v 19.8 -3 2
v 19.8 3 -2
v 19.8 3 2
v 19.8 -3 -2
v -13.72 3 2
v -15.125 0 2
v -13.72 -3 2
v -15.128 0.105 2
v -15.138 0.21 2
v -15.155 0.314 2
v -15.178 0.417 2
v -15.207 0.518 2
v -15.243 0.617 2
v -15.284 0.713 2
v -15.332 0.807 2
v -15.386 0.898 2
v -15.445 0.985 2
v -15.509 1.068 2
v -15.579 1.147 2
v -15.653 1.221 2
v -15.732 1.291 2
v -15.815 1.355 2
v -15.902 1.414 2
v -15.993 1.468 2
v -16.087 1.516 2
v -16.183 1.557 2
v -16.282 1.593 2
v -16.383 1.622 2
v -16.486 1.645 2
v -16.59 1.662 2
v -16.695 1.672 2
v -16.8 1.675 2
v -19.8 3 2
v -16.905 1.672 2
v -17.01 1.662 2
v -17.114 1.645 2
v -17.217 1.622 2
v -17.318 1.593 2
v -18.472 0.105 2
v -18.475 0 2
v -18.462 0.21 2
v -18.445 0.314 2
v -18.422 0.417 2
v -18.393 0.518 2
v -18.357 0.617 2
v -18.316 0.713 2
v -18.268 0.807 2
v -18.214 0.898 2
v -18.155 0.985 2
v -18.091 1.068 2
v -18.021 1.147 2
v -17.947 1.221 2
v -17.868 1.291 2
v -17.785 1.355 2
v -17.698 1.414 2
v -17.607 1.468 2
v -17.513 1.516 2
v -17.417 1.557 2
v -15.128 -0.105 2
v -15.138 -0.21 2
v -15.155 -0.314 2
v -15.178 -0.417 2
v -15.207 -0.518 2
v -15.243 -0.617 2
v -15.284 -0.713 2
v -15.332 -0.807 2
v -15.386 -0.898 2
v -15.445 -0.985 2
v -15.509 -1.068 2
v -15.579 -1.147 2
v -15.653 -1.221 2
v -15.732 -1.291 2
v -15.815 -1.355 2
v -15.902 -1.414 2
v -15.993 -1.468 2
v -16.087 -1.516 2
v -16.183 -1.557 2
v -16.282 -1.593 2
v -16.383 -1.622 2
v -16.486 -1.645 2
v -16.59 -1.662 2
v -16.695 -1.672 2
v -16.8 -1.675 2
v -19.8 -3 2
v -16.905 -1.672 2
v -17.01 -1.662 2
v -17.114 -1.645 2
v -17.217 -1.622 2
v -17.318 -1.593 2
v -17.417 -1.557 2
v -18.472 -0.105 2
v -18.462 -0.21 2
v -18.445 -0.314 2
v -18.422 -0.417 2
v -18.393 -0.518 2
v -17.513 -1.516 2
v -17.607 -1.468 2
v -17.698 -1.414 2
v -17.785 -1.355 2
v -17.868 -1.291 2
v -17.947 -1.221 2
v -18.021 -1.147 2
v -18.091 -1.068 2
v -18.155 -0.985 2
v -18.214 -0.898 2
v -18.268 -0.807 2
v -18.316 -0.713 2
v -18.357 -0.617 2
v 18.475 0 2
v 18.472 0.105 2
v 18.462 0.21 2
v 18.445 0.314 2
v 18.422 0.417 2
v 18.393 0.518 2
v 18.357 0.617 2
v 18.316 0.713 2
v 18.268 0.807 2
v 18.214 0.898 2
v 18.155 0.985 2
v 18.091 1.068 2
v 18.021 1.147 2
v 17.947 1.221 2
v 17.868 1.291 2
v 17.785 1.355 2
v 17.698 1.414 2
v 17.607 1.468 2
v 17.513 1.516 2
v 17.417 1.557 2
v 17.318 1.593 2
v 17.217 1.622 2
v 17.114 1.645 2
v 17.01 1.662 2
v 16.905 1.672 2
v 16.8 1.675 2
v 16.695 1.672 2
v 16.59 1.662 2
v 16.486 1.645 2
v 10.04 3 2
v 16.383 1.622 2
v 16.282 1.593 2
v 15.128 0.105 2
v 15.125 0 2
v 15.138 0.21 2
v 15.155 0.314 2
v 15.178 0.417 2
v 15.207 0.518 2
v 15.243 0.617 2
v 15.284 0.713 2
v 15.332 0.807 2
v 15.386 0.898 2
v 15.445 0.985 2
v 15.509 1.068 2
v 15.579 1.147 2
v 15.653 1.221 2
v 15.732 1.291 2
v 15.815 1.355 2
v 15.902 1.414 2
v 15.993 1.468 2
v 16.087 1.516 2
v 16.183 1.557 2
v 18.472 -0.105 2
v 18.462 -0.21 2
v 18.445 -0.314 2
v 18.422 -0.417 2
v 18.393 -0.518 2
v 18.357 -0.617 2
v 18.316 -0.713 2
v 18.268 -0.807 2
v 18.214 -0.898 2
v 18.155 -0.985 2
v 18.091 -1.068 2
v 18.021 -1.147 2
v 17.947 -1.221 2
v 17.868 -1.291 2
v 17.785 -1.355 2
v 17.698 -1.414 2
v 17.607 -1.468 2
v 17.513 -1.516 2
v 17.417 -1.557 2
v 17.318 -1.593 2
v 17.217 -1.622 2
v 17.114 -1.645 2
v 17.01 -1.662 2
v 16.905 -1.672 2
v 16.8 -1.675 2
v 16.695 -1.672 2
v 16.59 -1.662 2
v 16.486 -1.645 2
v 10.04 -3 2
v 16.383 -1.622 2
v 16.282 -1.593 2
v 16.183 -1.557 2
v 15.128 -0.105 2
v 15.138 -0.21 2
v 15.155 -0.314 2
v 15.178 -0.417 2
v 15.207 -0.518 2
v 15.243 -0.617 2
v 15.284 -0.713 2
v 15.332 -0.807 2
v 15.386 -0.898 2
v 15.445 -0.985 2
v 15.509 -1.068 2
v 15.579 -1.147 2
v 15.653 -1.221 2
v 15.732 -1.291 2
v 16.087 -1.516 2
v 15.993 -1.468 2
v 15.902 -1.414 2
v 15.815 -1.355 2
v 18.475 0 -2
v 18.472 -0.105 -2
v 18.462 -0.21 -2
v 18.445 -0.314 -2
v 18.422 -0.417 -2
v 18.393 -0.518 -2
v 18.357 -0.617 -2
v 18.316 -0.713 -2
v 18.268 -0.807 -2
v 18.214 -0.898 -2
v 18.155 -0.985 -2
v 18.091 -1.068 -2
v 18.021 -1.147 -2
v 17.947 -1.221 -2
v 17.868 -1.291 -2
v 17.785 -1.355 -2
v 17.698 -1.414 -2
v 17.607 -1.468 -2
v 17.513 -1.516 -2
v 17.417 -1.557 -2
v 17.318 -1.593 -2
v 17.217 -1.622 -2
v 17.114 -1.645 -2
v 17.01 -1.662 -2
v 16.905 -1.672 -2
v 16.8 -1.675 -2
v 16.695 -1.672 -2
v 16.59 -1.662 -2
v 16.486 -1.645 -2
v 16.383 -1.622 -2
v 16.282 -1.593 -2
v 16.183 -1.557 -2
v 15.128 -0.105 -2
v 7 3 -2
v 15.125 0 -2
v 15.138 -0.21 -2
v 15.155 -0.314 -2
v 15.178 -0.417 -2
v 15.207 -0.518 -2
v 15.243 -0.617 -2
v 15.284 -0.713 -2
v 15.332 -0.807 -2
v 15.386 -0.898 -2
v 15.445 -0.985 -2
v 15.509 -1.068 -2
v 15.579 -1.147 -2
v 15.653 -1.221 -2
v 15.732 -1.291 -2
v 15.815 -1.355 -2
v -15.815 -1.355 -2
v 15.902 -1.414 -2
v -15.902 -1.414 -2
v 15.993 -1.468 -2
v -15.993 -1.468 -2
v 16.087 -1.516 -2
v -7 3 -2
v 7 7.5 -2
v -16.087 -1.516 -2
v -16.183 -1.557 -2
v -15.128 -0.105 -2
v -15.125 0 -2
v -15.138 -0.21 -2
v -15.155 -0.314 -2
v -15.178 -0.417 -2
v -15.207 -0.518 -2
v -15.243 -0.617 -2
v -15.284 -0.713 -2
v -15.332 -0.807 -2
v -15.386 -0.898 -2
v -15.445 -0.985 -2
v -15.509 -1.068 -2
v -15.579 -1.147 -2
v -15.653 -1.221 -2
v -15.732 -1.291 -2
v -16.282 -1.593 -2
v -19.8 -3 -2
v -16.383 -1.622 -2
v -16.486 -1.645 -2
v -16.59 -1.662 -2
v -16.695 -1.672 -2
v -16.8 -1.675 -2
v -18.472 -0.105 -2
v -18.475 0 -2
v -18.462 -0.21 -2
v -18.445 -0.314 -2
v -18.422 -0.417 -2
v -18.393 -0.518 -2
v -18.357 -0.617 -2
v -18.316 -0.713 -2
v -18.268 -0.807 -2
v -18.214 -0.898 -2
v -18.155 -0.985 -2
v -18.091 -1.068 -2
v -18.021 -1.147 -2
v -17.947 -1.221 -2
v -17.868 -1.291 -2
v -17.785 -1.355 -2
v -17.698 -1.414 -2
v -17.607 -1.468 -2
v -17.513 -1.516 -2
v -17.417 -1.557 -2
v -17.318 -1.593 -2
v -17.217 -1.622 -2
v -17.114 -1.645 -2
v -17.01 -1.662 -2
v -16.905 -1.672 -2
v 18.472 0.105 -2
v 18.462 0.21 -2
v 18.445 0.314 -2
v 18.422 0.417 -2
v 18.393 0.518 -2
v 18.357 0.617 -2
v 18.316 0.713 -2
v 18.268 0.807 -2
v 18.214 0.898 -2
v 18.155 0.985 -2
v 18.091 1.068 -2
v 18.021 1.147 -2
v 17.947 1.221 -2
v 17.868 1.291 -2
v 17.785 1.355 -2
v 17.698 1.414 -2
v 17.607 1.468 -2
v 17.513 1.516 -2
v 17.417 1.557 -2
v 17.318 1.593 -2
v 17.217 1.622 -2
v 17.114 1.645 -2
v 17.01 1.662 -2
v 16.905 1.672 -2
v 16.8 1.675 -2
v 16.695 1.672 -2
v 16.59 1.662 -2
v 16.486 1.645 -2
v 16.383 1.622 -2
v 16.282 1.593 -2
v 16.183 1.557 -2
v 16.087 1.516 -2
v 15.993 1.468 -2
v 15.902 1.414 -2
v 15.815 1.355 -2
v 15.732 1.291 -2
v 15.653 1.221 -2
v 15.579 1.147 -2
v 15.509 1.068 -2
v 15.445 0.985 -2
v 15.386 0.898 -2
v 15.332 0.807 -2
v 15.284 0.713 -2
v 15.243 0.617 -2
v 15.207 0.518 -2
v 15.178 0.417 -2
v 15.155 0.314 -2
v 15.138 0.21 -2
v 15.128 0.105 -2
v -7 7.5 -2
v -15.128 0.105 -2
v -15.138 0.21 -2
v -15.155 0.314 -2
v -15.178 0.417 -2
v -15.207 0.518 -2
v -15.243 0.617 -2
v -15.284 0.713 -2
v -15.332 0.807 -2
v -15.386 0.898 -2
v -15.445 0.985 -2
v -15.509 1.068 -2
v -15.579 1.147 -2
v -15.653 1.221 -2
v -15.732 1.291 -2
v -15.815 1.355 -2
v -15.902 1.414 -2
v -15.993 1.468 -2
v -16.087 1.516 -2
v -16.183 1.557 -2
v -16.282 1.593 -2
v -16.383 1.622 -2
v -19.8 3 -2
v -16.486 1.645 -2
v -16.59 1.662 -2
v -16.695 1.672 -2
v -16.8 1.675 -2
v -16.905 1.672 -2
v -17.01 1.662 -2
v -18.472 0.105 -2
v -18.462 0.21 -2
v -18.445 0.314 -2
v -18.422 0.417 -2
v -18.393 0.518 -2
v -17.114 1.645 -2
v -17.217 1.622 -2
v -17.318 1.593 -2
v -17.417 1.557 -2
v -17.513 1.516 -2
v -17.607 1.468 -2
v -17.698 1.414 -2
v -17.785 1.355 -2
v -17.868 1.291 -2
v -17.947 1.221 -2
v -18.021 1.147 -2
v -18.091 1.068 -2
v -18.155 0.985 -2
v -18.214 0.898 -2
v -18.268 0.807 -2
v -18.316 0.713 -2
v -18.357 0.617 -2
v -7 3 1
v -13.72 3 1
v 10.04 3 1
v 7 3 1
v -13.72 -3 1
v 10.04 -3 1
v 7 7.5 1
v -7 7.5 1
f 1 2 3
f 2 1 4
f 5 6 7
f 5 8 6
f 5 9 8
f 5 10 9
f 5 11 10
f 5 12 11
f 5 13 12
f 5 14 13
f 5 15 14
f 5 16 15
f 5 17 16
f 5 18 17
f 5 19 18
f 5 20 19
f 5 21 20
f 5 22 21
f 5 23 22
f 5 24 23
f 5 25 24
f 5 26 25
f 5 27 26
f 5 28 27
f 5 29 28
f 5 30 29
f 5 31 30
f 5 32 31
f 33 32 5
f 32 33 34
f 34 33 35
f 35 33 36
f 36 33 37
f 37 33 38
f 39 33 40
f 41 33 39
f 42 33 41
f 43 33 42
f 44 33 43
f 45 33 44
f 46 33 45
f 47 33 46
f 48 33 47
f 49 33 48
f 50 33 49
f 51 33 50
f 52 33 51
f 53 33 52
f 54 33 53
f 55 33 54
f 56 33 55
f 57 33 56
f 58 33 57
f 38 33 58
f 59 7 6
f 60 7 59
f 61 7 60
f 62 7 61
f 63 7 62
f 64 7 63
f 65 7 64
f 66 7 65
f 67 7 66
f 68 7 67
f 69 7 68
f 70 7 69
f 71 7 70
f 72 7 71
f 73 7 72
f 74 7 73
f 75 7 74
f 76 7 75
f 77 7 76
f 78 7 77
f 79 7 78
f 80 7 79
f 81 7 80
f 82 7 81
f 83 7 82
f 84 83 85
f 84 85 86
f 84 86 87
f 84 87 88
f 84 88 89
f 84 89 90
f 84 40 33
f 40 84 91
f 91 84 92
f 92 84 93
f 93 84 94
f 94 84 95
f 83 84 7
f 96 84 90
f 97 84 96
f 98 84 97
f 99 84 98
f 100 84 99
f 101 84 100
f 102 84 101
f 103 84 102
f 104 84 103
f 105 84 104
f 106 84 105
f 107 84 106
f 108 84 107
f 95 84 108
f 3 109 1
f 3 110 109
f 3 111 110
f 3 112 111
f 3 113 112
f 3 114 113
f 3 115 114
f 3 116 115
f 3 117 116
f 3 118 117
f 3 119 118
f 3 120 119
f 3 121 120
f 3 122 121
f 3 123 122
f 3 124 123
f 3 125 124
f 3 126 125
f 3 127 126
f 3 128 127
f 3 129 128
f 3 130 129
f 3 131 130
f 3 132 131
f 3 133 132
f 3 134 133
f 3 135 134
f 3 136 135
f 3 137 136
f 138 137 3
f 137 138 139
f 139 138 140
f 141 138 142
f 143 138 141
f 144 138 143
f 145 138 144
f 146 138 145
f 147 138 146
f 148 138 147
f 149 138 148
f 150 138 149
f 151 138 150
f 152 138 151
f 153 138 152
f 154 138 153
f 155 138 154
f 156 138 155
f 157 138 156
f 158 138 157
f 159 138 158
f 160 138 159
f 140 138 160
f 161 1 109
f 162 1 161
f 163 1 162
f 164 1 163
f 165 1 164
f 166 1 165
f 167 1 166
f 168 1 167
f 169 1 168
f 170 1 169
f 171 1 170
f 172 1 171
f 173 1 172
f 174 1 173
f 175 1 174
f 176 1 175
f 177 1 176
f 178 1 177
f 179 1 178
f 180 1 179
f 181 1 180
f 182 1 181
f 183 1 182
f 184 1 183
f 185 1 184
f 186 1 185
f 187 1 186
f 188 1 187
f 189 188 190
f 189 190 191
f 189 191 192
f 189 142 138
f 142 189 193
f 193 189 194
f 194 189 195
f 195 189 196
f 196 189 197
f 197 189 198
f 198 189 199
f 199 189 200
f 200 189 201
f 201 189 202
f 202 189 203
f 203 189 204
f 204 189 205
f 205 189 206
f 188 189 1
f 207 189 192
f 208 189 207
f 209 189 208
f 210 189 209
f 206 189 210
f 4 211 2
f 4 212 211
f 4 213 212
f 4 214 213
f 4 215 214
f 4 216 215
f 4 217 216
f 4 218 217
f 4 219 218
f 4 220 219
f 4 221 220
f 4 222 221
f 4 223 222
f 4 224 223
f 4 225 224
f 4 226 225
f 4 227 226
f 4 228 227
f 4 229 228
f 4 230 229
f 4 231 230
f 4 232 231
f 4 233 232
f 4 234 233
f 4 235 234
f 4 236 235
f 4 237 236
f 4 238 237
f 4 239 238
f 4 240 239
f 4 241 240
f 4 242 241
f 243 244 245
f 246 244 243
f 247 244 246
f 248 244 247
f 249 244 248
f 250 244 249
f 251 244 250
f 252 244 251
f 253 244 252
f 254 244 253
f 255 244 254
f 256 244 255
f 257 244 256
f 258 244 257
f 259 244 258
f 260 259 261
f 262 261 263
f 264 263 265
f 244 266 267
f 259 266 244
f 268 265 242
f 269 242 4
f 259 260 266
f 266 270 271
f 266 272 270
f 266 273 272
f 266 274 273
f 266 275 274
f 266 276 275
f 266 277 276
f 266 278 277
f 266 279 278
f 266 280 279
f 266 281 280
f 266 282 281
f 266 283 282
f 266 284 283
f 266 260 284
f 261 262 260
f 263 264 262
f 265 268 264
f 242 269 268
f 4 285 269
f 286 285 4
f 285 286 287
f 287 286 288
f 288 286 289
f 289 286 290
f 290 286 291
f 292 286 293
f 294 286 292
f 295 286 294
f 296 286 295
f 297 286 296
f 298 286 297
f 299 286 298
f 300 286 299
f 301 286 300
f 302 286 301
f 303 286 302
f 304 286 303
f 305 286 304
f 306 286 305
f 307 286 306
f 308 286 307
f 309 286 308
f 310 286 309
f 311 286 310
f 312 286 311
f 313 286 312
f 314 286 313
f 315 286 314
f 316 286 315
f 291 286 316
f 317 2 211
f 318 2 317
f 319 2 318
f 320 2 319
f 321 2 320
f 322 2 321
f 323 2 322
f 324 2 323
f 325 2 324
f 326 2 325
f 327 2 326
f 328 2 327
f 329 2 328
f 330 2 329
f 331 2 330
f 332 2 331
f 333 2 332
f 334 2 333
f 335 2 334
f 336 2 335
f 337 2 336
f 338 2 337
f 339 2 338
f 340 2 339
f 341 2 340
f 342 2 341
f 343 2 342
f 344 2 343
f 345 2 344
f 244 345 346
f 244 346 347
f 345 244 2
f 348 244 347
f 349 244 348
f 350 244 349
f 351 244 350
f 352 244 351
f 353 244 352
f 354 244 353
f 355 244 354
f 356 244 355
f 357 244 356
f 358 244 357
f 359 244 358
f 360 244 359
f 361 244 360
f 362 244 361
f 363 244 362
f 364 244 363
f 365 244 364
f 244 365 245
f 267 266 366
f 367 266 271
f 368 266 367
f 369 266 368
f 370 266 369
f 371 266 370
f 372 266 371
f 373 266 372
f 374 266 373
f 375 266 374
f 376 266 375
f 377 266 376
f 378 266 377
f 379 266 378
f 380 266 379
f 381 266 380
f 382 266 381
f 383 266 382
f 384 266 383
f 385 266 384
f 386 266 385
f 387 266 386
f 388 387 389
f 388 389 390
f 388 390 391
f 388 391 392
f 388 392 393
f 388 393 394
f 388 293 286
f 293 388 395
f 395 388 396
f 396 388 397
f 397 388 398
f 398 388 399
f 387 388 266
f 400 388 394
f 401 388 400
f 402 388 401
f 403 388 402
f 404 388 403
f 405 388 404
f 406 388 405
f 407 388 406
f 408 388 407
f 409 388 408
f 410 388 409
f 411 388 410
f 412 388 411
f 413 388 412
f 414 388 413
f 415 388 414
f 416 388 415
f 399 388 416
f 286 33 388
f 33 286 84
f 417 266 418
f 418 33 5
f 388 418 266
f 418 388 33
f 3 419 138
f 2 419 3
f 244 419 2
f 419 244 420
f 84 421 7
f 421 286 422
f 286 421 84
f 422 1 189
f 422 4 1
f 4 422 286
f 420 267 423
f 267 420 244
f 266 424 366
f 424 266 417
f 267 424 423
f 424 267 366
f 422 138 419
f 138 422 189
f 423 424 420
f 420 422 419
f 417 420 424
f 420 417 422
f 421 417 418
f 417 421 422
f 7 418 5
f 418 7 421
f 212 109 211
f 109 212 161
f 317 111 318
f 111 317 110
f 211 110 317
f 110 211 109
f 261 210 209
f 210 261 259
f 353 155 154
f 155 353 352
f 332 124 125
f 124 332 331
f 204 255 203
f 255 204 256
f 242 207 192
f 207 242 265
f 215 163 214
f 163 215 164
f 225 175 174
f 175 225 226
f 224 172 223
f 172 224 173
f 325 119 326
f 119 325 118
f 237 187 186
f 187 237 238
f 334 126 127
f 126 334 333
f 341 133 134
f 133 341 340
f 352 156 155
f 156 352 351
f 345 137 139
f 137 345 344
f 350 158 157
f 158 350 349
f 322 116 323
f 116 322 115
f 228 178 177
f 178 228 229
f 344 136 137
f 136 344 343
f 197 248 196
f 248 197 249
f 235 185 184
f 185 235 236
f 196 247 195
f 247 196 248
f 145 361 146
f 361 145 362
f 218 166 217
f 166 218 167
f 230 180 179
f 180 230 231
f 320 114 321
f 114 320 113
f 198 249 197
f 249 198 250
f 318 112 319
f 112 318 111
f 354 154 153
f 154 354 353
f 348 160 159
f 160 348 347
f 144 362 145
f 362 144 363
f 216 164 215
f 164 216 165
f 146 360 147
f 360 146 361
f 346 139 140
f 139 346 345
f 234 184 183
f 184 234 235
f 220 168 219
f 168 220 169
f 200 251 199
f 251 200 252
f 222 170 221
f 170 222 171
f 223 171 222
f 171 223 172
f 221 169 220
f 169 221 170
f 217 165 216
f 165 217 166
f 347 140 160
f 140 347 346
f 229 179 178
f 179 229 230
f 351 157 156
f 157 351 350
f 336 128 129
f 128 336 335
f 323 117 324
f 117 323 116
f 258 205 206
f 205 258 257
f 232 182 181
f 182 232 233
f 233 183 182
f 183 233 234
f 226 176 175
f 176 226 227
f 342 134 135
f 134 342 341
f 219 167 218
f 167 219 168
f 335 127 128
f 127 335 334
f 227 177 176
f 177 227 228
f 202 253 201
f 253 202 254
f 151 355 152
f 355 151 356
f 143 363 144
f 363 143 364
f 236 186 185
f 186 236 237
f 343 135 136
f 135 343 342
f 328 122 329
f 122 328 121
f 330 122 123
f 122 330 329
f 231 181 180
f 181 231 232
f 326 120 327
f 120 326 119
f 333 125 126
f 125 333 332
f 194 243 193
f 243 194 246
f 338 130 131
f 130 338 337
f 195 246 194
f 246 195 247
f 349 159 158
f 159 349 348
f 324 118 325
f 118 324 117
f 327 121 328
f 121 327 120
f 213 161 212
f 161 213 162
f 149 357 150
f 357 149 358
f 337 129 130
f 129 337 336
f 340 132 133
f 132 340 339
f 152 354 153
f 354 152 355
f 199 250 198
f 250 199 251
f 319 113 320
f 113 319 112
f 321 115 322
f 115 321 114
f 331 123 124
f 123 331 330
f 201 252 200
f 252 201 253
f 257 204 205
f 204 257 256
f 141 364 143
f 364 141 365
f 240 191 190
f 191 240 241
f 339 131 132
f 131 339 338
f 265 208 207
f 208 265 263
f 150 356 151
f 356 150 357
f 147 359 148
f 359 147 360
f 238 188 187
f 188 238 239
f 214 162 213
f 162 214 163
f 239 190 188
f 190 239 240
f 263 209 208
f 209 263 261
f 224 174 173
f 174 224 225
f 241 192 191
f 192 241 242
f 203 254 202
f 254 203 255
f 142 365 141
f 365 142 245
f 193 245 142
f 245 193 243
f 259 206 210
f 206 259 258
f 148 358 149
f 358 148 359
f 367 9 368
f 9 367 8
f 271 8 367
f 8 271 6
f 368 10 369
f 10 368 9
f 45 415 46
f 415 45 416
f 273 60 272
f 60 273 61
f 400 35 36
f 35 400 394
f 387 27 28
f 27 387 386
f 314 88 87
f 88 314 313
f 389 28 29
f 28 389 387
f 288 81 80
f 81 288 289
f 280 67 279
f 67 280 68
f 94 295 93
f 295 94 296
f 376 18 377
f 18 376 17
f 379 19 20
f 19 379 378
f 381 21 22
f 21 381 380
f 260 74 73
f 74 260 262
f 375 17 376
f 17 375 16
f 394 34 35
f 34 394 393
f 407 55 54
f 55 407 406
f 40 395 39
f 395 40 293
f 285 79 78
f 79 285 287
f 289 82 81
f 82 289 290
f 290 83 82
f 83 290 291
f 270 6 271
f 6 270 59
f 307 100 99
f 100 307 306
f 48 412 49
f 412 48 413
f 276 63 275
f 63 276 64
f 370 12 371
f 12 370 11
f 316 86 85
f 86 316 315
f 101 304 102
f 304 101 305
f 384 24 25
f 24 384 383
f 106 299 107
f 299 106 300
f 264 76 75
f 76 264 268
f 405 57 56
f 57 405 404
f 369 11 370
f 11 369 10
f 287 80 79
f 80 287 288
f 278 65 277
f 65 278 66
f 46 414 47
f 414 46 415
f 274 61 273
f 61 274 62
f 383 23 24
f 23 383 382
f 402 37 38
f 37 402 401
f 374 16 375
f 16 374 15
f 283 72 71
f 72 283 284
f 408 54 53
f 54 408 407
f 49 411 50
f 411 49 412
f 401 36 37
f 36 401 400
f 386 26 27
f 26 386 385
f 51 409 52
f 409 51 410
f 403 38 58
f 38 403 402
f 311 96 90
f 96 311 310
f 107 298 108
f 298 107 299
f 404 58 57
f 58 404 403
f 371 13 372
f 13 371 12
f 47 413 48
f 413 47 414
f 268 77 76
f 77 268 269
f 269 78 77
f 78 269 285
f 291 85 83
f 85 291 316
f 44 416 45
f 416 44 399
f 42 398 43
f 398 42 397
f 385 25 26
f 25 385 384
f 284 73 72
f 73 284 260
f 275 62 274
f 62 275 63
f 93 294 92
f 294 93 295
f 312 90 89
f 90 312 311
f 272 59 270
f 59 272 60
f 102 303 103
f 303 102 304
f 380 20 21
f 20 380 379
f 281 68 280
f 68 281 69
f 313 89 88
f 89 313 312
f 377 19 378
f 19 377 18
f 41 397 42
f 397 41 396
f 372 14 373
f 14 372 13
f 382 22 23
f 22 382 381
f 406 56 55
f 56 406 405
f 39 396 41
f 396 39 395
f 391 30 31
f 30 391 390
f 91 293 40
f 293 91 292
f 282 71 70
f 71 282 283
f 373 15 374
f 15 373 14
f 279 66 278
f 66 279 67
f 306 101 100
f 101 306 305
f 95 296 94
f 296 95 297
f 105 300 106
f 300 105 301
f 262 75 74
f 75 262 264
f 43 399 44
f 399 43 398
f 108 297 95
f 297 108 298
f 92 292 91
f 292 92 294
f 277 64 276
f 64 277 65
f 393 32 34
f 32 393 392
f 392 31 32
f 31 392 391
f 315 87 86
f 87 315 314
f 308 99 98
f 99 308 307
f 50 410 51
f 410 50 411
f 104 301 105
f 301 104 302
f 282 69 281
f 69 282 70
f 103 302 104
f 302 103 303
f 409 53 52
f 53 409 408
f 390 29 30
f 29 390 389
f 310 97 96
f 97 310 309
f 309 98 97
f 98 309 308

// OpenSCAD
holderA8826D1SubPiece();

/**
 * holderA8826D1SubPiece
 * @name holderA8826D1SubPiece
 * @description One of two holder part
 * @type subPiece
 */
module holderA8826D1SubPiece(
    hole_3mm_correction = 0.35,
    encaps_width_correction = 0.4,

    part_holders_width = 7,
    board_width = 25.6,
    encaps_width = 23.36,
    encaps_height = 1,
    depth = 6,
    support_depth = 4.5,

    height = 4,
    throws_margin = 3,
    throws_diameter = 3,

    $fn = 100
) {

    width = board_width + (part_holders_width * 2);
    throws_diameter_with_correction = throws_diameter + hole_3mm_correction;
    encaps_width_with_correction = encaps_width + encaps_width_correction;

    difference() {
        union() {
            translate([0, 0, 0])
                cube([width, depth, height], center = true);

            translate([0, (depth / 2) + (support_depth / 2), 0])
                cube([14, support_depth, height], center = true);
        }

        translate([
            - (board_width - encaps_width_with_correction),
            0,
            height - encaps_height
        ])
            cube([
                encaps_width_with_correction,
                20,
                height
            ], center = true);

        translate([width / 2 - throws_margin, 0, 0])
            cylinder(h = height * 2, d = throws_diameter_with_correction, center = true, $fn = $fn);

        translate([- (width / 2) + throws_margin, 0, 0])
            cylinder(h = height * 2, d = throws_diameter_with_correction, center = true, $fn = $fn);

    }
}
